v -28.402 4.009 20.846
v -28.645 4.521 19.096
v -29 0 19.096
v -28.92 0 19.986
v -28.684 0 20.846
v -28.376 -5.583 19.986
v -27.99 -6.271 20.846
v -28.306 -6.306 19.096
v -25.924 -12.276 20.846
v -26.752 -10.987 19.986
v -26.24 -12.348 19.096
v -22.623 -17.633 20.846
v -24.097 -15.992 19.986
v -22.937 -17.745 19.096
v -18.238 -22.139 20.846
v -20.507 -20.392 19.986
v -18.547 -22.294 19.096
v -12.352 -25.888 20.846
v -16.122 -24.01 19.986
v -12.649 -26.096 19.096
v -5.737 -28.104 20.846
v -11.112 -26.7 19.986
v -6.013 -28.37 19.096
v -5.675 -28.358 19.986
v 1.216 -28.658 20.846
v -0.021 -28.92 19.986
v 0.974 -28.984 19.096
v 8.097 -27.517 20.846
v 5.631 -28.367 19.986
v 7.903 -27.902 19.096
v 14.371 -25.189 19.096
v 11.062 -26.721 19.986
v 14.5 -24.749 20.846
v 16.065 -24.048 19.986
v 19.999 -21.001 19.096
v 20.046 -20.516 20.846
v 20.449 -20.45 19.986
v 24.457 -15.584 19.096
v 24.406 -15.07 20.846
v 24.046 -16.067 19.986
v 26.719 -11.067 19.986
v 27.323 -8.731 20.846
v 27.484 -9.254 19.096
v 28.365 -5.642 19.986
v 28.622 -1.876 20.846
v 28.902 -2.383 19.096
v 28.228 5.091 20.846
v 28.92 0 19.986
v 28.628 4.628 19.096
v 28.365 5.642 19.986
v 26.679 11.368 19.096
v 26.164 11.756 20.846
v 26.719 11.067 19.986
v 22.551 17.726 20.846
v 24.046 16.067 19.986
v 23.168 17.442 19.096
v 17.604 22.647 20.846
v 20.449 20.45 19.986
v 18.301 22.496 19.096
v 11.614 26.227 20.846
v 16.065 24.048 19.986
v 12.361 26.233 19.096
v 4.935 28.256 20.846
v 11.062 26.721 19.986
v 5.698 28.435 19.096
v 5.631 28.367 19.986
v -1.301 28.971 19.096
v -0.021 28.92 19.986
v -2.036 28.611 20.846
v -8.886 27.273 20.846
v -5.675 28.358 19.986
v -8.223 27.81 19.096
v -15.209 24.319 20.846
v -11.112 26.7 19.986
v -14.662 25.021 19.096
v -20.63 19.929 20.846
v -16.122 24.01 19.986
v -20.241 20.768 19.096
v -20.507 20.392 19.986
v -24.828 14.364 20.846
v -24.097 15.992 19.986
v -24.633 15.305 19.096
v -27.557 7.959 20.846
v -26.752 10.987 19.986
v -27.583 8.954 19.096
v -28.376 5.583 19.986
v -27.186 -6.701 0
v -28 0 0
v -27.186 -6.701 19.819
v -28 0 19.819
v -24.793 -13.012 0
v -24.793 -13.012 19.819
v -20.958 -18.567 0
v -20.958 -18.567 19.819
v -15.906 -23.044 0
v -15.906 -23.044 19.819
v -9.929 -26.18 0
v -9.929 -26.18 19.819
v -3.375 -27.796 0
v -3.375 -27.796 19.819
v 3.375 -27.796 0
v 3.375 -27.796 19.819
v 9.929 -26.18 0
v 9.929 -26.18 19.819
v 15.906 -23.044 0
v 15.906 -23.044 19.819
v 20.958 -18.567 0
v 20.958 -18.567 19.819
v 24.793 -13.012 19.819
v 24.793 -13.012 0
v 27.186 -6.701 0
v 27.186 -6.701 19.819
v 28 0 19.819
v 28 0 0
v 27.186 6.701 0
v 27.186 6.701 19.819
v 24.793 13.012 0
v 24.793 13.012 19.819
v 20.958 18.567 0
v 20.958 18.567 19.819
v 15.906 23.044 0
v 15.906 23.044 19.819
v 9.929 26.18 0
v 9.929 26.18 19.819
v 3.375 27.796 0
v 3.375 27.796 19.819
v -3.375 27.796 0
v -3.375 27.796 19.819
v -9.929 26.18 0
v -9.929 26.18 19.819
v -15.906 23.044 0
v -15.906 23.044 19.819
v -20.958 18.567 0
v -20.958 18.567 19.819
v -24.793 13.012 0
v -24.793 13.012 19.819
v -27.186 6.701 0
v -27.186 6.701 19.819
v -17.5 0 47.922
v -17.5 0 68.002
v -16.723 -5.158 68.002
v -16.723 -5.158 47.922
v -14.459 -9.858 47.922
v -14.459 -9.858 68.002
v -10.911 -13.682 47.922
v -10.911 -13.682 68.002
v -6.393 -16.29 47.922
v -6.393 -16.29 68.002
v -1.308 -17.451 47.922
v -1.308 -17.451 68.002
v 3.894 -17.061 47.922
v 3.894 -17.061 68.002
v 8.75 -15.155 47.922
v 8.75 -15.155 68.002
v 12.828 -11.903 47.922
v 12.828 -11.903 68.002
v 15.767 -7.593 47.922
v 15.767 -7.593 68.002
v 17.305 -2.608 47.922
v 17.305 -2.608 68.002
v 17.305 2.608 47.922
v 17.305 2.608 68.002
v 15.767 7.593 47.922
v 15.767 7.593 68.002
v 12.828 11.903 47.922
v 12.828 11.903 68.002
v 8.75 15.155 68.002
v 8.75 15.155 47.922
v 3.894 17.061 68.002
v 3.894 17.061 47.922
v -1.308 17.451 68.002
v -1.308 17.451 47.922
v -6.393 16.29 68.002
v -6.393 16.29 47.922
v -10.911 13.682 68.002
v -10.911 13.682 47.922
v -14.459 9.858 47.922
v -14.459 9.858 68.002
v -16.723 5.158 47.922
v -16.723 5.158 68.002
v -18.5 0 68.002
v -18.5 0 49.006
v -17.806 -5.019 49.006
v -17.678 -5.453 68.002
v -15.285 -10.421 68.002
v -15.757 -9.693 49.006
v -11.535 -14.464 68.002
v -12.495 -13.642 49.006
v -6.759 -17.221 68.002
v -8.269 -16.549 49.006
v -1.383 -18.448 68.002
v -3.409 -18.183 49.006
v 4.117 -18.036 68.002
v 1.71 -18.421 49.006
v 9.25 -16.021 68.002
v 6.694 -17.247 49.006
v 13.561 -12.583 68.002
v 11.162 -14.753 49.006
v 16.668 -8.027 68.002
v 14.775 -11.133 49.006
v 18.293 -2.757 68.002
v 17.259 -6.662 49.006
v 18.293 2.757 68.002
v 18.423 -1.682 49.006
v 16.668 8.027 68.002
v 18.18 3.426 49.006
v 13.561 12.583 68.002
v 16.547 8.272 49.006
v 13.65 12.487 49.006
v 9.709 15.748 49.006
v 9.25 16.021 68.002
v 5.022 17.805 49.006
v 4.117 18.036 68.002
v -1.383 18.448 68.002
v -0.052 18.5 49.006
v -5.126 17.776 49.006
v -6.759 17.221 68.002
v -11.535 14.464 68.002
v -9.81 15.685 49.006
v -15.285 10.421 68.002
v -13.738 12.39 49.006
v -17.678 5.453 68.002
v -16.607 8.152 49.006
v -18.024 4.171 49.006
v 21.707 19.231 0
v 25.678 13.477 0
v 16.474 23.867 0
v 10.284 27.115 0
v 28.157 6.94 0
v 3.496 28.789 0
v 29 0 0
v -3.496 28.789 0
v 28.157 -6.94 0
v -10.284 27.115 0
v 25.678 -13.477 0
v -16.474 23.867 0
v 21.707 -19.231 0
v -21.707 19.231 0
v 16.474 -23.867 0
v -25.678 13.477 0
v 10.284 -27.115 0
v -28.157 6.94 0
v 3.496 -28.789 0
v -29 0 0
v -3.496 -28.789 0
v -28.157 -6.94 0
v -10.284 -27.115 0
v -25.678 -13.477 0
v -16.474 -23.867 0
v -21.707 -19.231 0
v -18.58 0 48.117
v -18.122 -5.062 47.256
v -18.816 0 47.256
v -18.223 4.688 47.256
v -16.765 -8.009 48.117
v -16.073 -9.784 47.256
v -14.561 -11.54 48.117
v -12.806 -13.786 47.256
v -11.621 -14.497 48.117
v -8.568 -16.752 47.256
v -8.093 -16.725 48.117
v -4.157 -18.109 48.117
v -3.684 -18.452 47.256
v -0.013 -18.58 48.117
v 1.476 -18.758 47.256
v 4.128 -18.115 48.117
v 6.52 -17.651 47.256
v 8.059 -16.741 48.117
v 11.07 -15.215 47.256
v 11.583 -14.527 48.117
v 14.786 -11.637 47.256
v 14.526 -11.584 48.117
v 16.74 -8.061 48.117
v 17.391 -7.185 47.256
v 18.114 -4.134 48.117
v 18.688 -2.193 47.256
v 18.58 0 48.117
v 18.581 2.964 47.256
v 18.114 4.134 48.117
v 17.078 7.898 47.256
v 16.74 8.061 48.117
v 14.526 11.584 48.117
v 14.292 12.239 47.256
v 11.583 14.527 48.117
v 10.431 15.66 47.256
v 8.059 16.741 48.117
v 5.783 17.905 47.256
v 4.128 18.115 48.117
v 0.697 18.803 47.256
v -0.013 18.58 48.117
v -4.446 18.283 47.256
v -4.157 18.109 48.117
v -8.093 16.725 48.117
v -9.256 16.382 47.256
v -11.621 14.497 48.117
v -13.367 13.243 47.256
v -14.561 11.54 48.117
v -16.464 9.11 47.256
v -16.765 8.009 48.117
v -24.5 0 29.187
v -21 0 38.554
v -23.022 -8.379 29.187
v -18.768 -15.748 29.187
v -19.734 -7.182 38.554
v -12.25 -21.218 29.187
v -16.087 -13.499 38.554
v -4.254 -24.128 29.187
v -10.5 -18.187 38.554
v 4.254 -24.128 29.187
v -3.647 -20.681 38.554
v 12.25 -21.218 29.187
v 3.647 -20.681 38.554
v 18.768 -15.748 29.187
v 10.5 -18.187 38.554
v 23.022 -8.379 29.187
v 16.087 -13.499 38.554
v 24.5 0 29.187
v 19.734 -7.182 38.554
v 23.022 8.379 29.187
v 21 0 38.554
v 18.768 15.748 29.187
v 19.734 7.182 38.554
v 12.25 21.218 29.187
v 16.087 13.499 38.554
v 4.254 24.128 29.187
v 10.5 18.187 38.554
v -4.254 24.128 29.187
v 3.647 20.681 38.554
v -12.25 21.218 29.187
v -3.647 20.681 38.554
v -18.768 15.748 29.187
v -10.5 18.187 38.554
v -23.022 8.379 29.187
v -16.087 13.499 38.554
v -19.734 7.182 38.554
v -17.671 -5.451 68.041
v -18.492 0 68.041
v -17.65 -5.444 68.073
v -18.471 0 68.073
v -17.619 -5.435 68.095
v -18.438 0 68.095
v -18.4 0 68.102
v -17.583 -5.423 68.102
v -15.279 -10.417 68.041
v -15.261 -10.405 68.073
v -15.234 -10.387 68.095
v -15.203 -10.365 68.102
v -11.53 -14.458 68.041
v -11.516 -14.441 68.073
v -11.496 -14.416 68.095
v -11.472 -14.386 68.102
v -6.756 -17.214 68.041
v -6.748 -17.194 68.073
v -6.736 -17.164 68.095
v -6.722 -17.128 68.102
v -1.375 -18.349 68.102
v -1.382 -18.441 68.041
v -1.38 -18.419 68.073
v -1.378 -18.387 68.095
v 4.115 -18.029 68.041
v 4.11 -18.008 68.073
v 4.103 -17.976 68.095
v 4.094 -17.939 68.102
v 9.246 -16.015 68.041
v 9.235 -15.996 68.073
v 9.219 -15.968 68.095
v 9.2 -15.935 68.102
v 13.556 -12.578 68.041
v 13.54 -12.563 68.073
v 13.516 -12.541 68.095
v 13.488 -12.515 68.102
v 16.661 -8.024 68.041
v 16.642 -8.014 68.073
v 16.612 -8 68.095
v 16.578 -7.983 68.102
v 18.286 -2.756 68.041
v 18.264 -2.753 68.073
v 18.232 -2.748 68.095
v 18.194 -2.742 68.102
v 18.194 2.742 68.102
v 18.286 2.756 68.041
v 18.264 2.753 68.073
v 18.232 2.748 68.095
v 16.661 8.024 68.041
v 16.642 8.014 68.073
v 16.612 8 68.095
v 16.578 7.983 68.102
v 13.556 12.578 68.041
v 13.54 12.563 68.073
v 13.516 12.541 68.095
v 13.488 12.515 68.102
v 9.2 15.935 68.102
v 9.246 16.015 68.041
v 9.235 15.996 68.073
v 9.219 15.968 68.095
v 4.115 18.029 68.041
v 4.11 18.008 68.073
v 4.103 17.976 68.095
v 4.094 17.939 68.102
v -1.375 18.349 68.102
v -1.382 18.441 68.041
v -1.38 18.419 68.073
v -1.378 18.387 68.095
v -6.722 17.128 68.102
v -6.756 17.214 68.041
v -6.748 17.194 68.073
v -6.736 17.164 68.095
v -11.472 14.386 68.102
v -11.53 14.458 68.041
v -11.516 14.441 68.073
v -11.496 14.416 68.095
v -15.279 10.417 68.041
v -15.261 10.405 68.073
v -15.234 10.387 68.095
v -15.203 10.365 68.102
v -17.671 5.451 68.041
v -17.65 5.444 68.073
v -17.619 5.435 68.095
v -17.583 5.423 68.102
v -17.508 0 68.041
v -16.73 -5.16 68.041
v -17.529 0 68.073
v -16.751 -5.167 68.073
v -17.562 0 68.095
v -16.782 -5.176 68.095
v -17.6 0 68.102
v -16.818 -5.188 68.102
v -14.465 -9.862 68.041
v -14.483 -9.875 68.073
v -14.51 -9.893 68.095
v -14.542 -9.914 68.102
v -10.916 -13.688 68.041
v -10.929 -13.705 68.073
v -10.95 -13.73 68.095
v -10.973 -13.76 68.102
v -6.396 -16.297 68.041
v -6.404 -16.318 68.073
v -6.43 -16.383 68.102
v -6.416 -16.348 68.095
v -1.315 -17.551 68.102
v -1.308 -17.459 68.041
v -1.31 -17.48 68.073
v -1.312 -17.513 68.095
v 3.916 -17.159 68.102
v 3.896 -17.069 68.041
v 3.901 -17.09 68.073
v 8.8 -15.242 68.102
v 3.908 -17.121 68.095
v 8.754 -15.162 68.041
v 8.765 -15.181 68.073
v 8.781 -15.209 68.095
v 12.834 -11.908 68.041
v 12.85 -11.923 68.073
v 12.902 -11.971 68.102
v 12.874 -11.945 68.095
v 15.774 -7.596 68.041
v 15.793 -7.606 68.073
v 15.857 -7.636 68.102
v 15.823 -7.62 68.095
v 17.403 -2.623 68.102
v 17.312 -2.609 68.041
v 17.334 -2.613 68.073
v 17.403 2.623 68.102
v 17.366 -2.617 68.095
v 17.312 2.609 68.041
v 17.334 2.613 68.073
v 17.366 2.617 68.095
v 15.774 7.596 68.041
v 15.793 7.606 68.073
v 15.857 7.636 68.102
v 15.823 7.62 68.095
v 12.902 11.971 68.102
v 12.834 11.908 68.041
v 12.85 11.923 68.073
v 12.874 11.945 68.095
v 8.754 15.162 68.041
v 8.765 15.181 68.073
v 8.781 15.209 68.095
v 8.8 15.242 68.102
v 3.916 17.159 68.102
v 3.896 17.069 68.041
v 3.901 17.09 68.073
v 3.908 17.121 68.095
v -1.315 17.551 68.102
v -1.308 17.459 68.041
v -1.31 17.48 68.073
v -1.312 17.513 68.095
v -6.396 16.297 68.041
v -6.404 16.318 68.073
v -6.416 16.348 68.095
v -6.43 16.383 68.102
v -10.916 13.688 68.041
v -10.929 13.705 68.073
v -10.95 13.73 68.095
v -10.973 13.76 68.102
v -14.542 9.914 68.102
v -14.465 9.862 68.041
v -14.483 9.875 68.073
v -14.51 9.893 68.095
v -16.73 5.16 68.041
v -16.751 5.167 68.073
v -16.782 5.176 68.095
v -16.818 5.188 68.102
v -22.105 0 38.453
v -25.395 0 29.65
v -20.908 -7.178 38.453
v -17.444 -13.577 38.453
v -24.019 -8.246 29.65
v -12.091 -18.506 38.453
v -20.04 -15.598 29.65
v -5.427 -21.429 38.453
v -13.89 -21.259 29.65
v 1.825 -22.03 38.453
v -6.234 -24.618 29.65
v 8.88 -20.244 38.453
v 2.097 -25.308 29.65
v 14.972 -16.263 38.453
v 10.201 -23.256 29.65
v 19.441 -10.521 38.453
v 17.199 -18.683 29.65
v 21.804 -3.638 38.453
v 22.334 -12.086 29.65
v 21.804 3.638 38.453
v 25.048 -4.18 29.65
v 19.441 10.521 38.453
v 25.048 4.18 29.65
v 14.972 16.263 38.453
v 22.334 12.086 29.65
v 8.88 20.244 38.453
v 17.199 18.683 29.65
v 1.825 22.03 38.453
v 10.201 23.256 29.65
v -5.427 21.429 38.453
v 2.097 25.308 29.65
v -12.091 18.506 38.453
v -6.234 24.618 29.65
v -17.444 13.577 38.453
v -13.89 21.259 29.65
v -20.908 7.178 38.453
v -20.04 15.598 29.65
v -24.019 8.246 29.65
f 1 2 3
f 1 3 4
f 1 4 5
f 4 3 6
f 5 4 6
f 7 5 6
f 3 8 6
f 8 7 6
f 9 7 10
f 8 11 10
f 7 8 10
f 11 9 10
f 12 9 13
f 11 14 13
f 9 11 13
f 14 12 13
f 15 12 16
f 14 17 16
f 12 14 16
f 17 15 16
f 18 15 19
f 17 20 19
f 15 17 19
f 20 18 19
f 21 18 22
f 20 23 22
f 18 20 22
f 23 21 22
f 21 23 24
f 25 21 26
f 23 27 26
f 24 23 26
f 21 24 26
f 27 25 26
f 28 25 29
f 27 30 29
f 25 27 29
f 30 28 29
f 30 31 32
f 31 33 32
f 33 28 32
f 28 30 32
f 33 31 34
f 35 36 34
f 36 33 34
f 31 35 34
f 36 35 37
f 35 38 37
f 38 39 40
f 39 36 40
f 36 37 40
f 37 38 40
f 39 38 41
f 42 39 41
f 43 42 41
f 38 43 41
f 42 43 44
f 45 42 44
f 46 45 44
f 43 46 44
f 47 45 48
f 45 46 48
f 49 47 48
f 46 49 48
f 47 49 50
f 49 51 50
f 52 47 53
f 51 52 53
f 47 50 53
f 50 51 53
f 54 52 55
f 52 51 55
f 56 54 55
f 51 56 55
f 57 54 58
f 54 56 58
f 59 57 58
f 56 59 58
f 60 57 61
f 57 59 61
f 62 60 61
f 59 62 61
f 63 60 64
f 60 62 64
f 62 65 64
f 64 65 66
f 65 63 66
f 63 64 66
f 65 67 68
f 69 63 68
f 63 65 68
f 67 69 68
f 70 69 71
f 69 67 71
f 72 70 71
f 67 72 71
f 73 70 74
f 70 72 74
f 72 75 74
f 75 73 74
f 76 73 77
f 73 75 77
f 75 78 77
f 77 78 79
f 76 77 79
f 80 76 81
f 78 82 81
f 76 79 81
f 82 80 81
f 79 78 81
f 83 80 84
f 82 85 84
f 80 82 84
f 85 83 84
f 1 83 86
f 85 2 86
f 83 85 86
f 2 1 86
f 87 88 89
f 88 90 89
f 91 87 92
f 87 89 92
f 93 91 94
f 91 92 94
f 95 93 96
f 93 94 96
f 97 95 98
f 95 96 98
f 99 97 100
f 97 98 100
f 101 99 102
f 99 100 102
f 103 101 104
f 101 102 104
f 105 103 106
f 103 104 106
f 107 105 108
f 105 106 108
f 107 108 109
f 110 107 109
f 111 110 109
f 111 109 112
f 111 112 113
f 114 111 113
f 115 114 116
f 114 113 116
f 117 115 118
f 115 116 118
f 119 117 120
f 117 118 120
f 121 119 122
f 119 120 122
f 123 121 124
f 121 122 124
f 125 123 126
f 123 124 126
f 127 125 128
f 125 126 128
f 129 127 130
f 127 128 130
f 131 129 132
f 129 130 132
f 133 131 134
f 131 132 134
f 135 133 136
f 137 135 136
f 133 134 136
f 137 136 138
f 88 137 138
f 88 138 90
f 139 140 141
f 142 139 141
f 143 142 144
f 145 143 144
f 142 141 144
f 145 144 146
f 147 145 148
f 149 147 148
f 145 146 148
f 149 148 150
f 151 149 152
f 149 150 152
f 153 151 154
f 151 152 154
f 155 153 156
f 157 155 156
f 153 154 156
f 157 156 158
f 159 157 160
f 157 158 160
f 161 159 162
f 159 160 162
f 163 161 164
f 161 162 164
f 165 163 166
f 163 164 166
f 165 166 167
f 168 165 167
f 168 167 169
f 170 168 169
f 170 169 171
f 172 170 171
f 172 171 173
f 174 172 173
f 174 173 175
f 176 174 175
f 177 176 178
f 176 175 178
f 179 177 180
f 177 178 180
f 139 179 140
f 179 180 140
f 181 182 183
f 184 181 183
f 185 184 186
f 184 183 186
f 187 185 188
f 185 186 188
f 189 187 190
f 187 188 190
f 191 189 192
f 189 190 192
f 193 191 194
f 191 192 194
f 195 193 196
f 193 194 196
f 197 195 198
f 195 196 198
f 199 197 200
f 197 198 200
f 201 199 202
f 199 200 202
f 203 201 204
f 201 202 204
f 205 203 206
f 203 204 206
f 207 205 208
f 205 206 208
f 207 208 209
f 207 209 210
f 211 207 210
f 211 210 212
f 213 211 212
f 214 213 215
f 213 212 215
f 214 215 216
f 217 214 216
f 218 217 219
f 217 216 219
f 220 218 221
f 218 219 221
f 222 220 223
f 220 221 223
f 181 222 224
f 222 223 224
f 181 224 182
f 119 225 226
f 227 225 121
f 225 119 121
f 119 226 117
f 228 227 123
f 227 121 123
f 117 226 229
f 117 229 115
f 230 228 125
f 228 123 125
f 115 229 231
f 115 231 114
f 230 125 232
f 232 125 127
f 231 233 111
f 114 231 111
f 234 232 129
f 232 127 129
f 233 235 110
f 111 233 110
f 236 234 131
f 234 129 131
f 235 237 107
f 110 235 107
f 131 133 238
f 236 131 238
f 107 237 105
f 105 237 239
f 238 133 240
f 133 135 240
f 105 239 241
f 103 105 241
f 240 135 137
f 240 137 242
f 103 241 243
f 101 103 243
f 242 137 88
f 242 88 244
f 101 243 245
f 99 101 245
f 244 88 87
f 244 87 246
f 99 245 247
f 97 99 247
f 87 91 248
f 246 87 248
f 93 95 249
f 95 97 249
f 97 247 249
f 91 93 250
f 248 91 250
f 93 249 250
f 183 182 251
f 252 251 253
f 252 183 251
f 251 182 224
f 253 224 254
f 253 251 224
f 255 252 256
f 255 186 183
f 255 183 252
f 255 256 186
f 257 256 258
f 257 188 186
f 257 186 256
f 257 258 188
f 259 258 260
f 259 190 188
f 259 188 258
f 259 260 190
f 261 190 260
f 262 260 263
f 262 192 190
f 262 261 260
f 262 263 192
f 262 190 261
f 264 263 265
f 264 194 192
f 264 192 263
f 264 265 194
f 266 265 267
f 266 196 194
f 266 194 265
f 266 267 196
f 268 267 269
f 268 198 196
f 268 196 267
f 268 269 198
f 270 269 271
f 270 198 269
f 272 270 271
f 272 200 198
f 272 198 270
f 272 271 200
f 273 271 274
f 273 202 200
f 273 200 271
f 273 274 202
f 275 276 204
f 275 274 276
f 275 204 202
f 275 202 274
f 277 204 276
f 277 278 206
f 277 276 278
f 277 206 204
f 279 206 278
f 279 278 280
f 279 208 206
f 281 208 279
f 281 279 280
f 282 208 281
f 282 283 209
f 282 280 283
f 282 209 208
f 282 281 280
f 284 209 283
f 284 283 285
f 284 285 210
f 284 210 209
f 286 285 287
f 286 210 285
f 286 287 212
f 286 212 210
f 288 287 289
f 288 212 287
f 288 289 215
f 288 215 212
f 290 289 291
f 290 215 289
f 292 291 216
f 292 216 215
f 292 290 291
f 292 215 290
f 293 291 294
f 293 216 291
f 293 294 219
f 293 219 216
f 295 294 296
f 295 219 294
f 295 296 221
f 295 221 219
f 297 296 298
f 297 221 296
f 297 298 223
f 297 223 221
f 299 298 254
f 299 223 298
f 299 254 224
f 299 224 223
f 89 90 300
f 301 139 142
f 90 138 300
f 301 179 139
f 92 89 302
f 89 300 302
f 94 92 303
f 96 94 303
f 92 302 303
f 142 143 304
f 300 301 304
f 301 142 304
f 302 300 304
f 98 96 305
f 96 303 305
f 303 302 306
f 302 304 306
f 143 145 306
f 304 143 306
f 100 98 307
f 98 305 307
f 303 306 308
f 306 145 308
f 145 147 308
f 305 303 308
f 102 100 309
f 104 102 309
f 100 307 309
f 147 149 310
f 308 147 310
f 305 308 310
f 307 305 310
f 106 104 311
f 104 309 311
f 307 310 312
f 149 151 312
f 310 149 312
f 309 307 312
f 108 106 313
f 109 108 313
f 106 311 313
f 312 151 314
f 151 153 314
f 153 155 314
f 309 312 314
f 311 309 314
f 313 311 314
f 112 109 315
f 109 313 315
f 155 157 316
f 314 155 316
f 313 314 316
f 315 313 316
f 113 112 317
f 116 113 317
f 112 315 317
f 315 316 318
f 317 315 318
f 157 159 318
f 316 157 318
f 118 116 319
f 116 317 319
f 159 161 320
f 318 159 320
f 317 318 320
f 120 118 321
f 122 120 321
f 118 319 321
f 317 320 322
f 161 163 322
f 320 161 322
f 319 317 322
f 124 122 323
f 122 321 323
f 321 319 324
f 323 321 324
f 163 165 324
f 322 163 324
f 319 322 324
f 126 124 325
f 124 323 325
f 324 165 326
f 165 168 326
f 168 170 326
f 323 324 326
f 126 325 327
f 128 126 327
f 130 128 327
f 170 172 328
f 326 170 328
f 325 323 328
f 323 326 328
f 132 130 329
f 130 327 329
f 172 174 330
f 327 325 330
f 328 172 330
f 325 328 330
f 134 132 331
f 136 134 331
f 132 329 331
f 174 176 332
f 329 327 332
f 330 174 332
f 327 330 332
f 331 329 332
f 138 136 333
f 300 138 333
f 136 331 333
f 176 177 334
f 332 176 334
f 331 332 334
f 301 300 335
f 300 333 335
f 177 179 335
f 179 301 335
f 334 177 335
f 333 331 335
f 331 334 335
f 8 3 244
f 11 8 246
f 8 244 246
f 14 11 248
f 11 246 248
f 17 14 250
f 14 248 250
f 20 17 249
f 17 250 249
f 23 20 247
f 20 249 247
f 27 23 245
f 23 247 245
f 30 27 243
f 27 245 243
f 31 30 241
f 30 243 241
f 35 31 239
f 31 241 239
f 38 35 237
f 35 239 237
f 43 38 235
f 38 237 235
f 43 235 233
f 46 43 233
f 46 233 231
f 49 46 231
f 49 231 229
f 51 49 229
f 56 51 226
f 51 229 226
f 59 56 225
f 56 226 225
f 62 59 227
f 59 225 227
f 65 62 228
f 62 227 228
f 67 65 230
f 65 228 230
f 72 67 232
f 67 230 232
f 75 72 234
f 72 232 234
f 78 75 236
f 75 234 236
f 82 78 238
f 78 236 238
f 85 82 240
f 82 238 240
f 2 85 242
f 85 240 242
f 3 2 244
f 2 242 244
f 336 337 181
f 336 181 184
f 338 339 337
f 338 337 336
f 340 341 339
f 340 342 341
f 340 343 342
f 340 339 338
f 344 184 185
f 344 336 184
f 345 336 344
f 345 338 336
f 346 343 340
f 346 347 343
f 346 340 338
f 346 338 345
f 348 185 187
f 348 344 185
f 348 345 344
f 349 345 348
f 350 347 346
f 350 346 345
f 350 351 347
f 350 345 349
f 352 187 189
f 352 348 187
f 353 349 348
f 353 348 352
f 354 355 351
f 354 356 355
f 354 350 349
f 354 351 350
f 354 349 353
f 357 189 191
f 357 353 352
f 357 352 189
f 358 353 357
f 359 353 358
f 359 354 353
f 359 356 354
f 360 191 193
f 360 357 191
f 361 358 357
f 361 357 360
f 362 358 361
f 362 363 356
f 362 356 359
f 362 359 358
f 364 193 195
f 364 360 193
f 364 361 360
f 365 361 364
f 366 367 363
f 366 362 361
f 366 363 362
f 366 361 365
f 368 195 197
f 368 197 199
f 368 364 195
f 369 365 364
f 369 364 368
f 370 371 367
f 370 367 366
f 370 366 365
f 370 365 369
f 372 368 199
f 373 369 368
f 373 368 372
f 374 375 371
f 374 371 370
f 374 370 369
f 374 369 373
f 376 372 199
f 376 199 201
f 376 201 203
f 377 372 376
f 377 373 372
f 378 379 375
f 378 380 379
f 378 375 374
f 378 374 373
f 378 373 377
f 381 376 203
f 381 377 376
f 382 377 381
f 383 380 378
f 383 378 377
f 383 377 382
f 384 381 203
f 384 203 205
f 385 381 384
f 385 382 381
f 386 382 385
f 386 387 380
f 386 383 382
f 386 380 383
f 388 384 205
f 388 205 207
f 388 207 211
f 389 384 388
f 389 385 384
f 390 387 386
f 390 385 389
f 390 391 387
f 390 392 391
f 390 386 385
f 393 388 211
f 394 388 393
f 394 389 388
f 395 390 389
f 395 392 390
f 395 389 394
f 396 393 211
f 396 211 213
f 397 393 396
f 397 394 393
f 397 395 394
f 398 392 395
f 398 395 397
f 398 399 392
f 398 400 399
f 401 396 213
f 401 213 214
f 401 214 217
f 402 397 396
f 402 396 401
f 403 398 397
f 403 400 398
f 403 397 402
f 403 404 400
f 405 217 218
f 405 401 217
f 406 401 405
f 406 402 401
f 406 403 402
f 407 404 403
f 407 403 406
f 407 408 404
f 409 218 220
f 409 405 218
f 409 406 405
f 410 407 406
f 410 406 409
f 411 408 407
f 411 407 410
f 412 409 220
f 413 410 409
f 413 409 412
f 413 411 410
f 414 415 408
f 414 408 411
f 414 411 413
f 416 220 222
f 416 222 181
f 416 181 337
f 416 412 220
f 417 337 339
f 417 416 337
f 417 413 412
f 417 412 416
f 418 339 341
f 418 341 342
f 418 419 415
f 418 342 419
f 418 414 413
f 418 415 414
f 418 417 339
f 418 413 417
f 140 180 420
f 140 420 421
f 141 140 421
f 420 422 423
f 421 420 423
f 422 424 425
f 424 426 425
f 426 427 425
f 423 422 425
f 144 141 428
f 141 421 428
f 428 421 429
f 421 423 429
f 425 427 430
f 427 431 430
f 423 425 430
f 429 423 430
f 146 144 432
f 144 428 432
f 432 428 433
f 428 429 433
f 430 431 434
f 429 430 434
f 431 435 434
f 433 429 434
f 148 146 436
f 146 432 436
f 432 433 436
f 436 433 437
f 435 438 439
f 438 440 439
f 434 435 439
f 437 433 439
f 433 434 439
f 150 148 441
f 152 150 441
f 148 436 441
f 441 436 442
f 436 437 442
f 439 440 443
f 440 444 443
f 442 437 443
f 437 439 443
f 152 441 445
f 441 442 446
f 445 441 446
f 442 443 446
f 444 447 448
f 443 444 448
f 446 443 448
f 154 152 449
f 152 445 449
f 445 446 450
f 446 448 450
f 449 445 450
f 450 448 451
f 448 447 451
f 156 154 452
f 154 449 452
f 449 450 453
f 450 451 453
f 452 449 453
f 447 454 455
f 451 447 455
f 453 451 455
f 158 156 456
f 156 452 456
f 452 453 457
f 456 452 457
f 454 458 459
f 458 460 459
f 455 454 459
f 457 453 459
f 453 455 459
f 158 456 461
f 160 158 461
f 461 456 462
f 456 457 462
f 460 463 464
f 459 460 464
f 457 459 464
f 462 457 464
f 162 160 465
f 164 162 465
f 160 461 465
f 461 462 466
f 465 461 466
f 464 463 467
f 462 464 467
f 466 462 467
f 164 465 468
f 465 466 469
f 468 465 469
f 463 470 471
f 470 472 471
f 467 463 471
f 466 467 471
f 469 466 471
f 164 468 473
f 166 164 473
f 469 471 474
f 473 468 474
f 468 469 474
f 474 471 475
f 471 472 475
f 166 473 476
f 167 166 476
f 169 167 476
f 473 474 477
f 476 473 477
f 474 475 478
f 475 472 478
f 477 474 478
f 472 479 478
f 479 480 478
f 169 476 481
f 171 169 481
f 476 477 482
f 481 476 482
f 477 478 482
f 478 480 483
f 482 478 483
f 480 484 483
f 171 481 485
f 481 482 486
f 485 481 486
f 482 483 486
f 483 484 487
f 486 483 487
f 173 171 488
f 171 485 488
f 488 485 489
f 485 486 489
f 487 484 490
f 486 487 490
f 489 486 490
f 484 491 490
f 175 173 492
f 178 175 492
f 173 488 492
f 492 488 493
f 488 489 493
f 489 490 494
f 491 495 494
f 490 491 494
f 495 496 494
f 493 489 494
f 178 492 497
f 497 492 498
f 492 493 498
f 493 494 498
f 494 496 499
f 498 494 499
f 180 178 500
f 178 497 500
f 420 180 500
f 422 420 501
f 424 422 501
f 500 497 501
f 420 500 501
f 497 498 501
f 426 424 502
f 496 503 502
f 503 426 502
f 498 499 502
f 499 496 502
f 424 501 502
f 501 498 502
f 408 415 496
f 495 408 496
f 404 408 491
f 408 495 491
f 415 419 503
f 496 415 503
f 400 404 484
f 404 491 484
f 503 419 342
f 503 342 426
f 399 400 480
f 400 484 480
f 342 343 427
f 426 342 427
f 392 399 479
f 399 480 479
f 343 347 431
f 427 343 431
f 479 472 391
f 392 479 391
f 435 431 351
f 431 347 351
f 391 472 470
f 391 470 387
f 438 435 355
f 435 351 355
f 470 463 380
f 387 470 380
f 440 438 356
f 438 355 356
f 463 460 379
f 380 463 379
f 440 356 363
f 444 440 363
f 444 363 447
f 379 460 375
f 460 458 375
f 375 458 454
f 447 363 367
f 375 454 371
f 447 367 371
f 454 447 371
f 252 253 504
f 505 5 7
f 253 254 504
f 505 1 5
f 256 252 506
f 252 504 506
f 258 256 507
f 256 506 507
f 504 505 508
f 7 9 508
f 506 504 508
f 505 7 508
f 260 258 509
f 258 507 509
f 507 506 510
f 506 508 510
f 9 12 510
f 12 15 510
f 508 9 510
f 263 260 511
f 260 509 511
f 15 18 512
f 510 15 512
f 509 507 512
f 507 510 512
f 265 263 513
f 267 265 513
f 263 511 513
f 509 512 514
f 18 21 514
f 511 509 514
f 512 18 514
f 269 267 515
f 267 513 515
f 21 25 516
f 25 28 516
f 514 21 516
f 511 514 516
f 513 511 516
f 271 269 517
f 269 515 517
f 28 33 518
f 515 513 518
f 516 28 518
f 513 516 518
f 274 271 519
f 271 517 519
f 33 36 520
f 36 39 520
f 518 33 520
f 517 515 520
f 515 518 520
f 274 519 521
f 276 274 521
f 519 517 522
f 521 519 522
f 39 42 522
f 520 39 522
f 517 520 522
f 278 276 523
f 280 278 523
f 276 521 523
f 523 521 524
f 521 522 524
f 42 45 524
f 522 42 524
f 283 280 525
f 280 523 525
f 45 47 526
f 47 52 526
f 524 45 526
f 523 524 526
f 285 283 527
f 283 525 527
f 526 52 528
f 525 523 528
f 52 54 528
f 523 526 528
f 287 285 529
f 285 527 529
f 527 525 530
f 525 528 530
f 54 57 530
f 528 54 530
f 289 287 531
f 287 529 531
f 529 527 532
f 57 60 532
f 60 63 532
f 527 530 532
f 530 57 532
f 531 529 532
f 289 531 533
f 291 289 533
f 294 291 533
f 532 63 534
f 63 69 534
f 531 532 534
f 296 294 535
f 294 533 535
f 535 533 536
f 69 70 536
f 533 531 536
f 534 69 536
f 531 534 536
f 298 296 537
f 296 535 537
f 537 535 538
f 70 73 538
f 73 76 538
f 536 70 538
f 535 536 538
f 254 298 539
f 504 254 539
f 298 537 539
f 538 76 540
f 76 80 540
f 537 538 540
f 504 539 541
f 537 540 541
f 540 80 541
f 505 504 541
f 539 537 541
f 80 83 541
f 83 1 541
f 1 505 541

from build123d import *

# Parameters (mm, degrees)
F2_R = 5
F3_R = 0.1


with BuildPart() as f1:
    # F0 (on Front) → F1 (revolve)
    with BuildSketch(Plane.XZ):
        Polygon((-29, 20), (-29, 0), (-28, 0), (-28, 19.8192848565), (-17.5, 47.9217758492), (-17.5, 68.1024909928), (-18.5, 68.1024909928), (-18.5, 48.1024909928), align=None)
    revolve(axis=Axis((0, 0, 23.4480407089), (0, 0, 1)))

    # F2
    f2_edges = [f1.edges().sort_by_distance(p)[0] for p in [
        (29, 0, 20),
        (18.5, 0, 48.102491),
    ]]
    fillet(f2_edges, radius=F2_R)

    # F3
    f3_edges = [f1.edges().sort_by_distance(p)[0] for p in [
        (17.5, 0, 68.102491),
        (18.5, 0, 68.102491),
    ]]
    fillet(f3_edges, radius=F3_R)


solid = f1.part
